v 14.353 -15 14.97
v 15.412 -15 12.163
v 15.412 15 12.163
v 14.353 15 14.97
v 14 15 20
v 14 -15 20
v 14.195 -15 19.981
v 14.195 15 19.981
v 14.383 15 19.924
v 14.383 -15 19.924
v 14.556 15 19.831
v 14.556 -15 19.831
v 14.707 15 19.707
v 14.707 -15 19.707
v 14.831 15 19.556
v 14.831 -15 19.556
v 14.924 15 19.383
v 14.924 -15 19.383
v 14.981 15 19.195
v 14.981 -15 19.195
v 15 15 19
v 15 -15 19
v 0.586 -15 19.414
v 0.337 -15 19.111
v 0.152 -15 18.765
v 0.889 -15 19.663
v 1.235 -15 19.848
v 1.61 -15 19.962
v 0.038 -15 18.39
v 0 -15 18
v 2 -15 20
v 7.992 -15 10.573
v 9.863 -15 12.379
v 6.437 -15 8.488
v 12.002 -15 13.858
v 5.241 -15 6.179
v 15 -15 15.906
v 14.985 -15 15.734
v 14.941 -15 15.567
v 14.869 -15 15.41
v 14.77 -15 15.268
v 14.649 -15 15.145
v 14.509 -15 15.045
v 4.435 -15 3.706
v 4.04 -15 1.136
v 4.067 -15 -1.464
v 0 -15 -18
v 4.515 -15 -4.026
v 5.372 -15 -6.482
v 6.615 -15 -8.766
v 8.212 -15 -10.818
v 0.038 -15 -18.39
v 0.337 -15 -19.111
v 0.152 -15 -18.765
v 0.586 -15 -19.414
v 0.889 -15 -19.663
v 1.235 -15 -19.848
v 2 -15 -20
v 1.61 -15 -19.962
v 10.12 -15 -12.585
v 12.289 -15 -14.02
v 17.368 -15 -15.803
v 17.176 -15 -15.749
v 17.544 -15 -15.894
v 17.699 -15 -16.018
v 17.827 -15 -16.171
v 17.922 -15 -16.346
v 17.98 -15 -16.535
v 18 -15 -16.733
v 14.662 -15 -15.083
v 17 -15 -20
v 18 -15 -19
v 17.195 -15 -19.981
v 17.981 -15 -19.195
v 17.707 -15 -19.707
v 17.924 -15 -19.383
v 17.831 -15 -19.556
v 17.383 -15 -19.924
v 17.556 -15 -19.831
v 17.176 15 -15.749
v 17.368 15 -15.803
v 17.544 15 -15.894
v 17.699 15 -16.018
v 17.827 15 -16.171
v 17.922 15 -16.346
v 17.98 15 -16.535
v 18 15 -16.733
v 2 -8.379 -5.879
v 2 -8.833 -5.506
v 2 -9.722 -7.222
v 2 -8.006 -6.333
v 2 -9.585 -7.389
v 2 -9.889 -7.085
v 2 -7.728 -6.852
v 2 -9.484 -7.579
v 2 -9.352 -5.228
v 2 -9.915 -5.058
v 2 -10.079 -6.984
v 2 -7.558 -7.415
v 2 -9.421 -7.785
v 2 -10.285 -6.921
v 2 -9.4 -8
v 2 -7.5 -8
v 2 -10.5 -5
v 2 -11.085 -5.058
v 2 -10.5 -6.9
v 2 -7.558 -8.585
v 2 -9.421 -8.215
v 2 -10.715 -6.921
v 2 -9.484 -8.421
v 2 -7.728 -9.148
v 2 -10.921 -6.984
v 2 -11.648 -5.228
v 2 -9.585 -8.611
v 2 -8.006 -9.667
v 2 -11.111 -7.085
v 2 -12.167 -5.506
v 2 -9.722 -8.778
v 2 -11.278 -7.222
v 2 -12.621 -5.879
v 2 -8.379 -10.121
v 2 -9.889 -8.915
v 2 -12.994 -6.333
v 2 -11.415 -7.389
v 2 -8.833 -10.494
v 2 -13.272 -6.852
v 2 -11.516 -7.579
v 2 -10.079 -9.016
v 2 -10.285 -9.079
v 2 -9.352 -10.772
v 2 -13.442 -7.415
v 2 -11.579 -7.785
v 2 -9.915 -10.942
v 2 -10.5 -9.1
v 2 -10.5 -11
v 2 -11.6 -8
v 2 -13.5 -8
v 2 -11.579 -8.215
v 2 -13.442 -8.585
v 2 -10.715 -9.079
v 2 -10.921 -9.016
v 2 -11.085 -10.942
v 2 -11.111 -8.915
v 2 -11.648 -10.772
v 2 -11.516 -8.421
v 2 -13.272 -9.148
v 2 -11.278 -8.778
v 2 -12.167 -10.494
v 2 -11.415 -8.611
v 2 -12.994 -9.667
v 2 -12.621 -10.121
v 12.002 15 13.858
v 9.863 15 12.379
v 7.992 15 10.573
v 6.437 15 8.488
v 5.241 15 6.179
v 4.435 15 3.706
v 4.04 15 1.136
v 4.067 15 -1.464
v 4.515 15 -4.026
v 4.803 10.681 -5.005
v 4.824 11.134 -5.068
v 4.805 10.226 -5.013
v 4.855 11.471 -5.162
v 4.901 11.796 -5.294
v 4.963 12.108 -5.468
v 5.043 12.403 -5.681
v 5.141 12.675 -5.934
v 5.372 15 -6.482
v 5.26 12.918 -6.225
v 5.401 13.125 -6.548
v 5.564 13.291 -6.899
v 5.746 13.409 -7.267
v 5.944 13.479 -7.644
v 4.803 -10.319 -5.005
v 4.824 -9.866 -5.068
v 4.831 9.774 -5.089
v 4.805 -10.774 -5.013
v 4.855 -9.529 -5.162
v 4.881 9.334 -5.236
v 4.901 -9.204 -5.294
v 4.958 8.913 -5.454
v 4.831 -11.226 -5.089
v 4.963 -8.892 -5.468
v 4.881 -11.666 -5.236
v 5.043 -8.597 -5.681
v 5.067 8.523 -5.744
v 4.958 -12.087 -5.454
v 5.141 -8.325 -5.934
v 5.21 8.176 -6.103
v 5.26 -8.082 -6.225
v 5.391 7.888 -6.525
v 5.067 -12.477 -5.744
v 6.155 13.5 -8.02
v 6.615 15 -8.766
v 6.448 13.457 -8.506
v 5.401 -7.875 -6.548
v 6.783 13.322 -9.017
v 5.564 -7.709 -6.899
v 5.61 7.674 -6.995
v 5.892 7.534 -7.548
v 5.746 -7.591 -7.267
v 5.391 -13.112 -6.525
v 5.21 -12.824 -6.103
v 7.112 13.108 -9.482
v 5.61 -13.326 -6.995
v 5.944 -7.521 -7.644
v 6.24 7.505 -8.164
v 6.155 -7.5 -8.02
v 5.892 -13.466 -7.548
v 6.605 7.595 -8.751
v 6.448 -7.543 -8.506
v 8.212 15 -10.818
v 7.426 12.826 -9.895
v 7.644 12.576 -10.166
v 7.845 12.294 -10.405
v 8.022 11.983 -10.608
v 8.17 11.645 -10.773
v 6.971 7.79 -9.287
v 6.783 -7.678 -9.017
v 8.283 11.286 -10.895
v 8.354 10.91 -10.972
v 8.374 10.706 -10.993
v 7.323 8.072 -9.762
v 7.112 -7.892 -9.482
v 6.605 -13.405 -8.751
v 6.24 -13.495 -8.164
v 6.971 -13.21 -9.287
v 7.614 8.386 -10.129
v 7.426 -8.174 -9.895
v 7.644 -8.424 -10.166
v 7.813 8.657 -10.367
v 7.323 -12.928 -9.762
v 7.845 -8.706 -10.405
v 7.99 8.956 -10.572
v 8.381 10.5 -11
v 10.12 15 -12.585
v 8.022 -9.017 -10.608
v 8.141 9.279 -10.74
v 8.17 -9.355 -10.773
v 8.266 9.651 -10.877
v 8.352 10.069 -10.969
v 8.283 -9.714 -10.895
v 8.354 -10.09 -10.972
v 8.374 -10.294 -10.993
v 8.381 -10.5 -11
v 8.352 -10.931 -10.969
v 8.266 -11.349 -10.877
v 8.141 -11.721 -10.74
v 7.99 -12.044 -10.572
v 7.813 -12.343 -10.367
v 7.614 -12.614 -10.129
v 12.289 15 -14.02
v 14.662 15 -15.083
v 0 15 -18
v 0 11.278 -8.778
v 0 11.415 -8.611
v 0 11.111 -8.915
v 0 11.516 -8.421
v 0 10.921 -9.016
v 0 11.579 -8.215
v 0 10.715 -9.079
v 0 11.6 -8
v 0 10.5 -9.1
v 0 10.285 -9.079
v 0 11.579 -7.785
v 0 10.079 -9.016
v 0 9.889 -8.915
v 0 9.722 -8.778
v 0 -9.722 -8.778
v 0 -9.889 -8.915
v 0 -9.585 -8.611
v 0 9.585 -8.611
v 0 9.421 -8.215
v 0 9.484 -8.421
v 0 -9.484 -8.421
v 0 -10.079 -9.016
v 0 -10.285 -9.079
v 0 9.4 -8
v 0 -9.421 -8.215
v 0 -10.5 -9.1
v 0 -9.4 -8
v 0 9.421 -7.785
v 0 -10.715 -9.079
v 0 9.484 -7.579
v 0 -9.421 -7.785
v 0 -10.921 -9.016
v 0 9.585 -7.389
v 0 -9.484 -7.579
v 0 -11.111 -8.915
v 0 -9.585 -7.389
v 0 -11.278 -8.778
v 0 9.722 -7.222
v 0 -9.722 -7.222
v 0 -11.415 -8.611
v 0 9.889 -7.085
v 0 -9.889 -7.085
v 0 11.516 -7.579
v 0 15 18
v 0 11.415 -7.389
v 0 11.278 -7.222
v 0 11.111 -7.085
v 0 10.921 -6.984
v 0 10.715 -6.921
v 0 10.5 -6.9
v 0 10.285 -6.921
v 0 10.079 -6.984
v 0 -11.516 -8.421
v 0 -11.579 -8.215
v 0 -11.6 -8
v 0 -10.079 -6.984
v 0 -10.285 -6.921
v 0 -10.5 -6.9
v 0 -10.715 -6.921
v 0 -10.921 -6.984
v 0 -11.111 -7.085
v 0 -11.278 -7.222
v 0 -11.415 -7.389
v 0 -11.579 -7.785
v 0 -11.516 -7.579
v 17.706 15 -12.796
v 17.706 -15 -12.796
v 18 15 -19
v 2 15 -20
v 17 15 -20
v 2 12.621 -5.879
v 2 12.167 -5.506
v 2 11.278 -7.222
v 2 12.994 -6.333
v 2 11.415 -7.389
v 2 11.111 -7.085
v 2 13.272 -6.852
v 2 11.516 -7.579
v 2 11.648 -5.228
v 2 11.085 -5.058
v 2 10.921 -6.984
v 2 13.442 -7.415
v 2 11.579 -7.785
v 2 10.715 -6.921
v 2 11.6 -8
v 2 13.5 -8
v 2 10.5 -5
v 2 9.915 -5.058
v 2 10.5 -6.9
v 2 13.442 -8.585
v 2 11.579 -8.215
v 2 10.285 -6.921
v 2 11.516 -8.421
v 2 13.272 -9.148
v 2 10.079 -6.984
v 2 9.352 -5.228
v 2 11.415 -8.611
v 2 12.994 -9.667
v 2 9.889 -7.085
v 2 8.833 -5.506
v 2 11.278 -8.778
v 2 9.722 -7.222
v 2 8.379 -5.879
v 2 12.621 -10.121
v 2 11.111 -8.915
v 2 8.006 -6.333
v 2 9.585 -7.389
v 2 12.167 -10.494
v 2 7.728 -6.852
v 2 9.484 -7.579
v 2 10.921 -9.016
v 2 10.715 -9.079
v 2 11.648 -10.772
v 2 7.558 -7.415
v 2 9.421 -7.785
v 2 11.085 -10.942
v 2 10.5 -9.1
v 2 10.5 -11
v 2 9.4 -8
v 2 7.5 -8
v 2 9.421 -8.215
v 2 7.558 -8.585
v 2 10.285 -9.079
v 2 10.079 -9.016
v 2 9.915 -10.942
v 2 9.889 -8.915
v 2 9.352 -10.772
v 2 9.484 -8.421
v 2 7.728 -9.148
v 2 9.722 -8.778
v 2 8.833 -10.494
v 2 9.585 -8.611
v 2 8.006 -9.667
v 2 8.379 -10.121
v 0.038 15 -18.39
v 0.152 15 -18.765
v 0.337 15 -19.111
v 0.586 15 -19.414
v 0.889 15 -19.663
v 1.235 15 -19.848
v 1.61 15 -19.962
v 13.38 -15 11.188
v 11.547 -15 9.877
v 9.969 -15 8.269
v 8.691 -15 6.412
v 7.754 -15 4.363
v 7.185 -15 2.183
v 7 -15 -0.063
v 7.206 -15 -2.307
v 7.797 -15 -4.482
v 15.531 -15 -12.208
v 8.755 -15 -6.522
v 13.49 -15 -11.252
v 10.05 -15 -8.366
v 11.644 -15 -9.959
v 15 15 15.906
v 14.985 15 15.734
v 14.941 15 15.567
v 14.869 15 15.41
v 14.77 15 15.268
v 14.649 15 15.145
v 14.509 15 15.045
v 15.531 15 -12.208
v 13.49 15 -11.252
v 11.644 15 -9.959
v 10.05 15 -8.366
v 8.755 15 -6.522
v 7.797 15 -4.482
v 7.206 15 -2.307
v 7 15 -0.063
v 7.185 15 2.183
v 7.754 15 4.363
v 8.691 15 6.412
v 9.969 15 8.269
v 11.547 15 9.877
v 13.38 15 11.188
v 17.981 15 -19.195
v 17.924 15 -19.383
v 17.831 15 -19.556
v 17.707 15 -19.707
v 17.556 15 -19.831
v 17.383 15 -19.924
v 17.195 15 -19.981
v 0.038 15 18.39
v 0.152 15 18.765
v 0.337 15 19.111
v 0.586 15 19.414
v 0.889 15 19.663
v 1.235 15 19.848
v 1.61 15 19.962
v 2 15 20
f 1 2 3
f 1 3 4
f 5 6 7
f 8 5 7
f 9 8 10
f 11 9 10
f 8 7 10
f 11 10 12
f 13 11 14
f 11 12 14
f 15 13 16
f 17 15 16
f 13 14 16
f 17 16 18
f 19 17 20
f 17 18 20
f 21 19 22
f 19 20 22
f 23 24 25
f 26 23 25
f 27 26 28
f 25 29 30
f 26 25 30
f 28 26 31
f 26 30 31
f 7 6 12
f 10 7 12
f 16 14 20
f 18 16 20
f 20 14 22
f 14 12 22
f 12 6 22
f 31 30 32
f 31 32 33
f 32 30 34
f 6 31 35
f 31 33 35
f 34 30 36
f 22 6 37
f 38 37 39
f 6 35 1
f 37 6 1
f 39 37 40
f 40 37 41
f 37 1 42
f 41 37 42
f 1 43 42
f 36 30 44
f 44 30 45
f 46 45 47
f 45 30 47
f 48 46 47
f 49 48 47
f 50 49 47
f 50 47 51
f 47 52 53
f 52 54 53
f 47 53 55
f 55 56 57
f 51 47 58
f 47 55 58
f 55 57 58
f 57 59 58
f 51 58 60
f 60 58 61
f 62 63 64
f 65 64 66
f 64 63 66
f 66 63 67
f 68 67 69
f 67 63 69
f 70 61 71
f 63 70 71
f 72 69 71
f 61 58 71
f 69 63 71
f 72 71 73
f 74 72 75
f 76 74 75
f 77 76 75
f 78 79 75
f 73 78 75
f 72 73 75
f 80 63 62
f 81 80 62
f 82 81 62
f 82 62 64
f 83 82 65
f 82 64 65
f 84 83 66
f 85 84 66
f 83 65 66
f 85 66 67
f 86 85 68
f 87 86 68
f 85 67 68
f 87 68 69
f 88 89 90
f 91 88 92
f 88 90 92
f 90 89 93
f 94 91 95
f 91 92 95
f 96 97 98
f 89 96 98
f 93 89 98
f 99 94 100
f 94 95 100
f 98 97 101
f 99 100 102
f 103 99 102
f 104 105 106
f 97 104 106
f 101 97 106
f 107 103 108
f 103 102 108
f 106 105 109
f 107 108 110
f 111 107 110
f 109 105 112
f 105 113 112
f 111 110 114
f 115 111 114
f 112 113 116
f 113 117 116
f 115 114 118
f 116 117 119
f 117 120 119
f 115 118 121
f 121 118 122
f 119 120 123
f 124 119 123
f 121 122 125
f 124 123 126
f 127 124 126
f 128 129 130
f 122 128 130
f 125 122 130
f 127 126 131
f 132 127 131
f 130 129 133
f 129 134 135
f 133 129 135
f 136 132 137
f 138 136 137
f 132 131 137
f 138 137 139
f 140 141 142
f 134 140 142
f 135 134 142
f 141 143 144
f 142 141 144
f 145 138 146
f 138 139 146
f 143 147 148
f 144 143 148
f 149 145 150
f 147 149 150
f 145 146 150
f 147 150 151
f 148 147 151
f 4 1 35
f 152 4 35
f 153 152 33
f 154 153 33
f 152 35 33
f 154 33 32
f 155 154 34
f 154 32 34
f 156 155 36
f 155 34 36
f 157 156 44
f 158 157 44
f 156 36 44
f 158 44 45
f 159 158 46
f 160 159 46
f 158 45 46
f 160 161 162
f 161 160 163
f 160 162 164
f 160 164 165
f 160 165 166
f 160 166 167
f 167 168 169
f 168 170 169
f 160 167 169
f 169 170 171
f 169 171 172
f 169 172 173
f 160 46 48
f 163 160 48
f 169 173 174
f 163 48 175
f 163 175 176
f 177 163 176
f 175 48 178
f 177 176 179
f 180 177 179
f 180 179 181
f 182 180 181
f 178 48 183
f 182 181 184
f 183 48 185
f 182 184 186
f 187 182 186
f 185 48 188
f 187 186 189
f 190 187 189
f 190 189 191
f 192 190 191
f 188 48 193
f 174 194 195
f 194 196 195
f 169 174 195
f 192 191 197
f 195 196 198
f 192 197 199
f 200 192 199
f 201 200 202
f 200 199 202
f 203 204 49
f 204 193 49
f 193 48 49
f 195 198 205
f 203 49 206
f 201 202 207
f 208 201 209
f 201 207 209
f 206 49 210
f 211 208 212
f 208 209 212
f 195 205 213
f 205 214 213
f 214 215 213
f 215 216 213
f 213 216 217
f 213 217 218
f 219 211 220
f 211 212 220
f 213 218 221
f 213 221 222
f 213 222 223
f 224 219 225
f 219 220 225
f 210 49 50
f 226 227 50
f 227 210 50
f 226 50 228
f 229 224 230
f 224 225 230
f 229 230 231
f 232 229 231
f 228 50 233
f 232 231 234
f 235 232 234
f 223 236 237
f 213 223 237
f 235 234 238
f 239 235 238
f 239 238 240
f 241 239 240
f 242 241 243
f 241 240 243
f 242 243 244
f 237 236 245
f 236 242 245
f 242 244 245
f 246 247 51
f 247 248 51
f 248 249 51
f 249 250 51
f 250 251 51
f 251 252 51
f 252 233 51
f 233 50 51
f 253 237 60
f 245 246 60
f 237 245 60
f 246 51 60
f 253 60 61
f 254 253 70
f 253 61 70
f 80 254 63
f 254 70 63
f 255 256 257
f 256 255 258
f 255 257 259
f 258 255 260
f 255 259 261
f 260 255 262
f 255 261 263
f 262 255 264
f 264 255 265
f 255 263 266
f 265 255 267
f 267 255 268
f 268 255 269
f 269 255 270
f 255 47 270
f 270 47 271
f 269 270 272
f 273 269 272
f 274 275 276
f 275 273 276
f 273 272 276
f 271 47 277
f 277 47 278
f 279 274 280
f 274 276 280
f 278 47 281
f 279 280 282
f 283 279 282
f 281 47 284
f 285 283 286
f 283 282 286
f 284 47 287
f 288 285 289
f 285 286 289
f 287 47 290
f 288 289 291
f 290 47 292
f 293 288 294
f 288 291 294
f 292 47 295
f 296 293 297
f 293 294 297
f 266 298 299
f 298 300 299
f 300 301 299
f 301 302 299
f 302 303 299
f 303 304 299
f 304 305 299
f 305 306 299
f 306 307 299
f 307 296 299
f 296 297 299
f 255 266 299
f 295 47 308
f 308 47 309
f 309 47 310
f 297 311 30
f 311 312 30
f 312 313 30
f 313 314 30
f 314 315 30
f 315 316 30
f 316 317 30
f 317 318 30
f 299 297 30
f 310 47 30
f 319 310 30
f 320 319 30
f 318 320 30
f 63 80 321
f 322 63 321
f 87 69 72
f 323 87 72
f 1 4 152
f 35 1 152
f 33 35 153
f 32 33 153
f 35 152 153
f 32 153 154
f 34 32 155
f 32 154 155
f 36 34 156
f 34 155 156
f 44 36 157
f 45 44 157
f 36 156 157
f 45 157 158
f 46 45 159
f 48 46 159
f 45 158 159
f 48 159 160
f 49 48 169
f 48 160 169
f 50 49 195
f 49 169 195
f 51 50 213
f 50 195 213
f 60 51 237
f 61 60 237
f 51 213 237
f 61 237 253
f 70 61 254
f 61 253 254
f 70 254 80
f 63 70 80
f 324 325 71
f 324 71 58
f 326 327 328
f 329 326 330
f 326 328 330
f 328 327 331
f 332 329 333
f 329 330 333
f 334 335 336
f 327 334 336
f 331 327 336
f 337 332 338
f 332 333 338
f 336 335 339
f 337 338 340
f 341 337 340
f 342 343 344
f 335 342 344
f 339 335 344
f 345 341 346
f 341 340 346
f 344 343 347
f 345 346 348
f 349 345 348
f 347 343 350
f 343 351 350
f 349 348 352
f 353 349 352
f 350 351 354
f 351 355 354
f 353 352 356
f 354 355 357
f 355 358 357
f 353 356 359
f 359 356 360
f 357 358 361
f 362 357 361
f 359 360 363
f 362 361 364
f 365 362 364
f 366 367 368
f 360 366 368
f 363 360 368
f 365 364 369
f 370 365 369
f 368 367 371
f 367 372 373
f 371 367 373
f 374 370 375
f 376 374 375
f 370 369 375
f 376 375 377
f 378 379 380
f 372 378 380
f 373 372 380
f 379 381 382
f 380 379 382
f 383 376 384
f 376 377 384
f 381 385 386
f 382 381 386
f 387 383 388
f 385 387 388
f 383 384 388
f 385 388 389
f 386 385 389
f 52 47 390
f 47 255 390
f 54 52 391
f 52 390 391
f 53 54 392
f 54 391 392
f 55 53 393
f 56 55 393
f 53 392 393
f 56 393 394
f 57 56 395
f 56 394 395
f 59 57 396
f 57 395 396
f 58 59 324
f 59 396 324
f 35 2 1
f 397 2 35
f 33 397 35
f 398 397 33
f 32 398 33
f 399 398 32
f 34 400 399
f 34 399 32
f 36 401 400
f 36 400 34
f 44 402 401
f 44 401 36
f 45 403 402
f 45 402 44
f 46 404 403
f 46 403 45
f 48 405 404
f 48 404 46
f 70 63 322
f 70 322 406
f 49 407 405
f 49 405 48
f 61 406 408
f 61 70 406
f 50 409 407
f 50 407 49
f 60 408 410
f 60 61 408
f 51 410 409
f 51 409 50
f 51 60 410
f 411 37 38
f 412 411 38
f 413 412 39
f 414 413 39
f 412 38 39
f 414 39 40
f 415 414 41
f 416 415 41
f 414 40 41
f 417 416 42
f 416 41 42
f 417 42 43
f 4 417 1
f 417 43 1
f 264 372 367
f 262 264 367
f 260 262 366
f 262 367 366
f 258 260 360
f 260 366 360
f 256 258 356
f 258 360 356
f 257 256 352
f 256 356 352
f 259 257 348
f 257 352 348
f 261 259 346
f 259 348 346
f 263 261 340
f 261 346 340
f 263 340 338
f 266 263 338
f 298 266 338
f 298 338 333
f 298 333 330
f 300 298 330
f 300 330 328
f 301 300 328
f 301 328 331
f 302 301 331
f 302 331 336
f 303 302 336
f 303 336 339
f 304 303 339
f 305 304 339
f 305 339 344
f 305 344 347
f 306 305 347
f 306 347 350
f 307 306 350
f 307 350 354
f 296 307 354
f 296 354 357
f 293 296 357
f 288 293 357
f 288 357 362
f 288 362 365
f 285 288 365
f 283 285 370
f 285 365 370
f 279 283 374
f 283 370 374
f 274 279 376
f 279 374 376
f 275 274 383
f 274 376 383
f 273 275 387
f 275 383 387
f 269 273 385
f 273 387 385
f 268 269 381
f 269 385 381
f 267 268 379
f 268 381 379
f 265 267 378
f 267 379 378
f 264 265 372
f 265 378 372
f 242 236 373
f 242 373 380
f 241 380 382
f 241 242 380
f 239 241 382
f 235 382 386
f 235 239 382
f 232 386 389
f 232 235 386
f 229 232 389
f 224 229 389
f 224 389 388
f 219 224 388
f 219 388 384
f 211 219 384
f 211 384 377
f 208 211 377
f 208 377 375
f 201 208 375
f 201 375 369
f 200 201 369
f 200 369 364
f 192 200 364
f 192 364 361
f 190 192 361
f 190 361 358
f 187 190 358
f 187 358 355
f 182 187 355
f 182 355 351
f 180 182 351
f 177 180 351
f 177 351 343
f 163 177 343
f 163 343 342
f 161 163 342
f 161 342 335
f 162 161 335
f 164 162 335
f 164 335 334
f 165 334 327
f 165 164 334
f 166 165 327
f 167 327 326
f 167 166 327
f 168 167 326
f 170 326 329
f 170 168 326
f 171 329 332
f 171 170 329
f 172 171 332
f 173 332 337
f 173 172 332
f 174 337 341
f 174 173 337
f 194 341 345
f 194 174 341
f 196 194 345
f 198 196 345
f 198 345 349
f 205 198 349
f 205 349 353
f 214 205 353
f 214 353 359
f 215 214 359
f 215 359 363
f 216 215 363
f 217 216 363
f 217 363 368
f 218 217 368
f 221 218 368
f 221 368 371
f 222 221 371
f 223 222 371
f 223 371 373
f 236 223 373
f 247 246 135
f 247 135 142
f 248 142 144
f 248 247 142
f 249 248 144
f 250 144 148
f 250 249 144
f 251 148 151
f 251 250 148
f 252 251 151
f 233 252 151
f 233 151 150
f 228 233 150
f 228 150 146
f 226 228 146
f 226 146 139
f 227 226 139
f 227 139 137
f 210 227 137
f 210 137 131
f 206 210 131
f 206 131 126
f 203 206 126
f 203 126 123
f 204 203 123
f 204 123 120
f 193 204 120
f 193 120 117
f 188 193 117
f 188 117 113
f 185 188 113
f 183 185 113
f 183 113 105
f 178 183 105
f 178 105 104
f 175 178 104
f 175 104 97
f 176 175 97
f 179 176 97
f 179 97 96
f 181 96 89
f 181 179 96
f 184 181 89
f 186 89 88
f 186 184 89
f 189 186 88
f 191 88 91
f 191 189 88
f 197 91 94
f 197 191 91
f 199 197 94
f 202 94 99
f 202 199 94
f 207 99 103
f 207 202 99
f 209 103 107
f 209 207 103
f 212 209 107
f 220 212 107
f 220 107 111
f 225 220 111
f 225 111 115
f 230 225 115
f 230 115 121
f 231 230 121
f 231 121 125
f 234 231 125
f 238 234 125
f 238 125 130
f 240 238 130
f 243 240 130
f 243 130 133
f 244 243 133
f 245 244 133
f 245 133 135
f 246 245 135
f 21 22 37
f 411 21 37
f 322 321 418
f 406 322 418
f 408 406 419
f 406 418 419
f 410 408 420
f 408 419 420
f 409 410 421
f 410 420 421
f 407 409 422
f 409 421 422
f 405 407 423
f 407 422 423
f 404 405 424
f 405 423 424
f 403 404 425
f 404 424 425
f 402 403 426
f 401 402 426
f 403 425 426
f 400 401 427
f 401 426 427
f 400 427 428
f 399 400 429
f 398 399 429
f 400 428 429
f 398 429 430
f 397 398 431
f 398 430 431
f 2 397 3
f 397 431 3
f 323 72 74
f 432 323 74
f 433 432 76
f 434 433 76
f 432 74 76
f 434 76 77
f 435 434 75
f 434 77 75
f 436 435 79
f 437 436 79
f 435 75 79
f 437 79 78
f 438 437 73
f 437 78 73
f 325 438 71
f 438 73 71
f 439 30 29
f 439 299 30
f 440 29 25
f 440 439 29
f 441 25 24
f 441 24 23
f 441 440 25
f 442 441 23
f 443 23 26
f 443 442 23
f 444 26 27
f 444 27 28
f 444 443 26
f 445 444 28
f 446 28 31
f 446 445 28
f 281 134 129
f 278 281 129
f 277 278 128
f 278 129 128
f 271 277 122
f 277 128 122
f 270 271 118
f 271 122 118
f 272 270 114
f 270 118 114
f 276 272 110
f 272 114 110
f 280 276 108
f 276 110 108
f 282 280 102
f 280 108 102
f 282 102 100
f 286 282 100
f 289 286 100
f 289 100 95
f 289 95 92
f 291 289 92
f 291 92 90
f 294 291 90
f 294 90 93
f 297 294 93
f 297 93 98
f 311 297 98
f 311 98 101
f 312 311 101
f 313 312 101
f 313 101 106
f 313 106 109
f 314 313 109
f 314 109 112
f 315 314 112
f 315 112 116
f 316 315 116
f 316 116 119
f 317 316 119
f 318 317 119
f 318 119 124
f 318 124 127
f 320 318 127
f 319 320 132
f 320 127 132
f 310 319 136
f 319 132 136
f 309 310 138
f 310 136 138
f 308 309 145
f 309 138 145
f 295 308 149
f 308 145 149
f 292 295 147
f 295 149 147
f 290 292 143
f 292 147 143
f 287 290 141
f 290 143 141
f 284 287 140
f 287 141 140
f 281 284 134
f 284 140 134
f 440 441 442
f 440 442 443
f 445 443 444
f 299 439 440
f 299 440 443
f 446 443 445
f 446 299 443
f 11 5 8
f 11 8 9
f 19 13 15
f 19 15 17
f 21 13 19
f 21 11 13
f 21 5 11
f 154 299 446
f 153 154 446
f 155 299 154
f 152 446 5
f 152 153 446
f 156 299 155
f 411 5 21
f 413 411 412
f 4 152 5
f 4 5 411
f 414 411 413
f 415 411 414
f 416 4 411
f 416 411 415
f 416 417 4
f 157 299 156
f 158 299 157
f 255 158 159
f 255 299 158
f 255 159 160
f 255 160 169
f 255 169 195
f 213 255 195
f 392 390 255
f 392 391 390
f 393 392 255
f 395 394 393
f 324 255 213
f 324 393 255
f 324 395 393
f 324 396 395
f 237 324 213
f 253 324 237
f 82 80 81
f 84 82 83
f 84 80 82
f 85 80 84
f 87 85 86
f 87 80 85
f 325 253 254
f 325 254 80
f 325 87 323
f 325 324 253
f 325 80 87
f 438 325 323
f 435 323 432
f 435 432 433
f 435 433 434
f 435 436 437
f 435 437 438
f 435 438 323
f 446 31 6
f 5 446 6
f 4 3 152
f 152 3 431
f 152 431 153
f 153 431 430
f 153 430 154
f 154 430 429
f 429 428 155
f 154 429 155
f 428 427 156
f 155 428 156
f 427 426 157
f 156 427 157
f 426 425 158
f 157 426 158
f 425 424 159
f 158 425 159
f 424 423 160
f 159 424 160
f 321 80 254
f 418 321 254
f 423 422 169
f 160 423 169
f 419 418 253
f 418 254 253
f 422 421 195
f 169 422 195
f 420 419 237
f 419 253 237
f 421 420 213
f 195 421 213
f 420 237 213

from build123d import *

# Parameters (mm, degrees)
EXTRUDE_1_DEPTH      = 15
EXTRUDE_1_DEPTH_BACK = 15
SKETCH_2_R           = 1.1
CUT_EXTRUDE_1_DEPTH  = 31.805843601
SKETCH_3_R           = 3
CUT_EXTRUDE_2_DEPTH  = 8
FILLET_1_R           = 2
EXTRUDE_2_DEPTH      = 30


with BuildPart() as part:
    # ｽｹｯﾁ1 → ﾎﾞｽ - 押し出し1 (new, two sides: drawn at the far end of the back side and taken through both)
    with BuildSketch(Plane(origin=(0, 0, 0), x_dir=(1, 0, 0), z_dir=(0, 1, 0)).offset(-EXTRUDE_1_DEPTH_BACK)):
        with BuildLine():
            Line((0, 20), (0, -20))
            Line((0, -20), (14, -20))
            ThreePointArc((14, -20), (14.707106781, -19.707106781), (15, -19))
            Line((15, -19), (15, -15.905973721))
            ThreePointArc((15, -15.905973721), (14.822478321, -15.337177262), (14.352941176, -14.970328208))
            ThreePointArc((14.352941176, -14.970328208), (4.06716036, 1.464452457), (17.176470588, 15.748894617))
            ThreePointArc((17.176470588, 15.748894617), (17.766964989, 16.091511583), (18, 16.733200531))
            Line((18, 16.733200531), (18, 19))
            ThreePointArc((18, 19), (17.707106781, 19.707106781), (17, 20))
            Line((17, 20), (0, 20))
        make_face()
    extrude(amount=EXTRUDE_1_DEPTH + EXTRUDE_1_DEPTH_BACK)

    # ｽｹｯﾁ2 → ｶｯﾄ - 押し出し1 (cut, through all)
    with BuildSketch(Plane(origin=(18, 0, 0), x_dir=(0, 0, -1), z_dir=(1, 0, 0))):
        with Locations((8, 10.5)):
            Circle(SKETCH_2_R)
        with Locations((8, -10.5)):
            Circle(SKETCH_2_R)
    extrude(amount=-CUT_EXTRUDE_1_DEPTH, mode=Mode.SUBTRACT)

    # ｽｹｯﾁ3 → ｶｯﾄ - 押し出し2 (cut)
    with BuildSketch(Plane.ZY.offset(-10)):
        with Locations(Location((-8, 10.5, 0), (0, 0, 180))):
            Circle(SKETCH_3_R)
        with Locations(Location((-8, -10.5, 0), (0, 0, 180))):
            Circle(SKETCH_3_R)
    extrude(amount=CUT_EXTRUDE_2_DEPTH, mode=Mode.SUBTRACT)

    # ﾌｨﾚｯﾄ1
    fillet_1_edges = [part.edges().sort_by_distance(p)[0] for p in [
        (0, 0, 20),
        (0, 0, -20),
    ]]
    fillet(fillet_1_edges, radius=FILLET_1_R)


with BuildPart() as body_2:
    # ｽｹｯﾁ5 → ﾎﾞｽ - 押し出し2 (new body)
    with BuildSketch(Plane(origin=(0, 15, 0), x_dir=(1, 0, 0), z_dir=(0, 1, 0))):
        with BuildLine():
            Line((17.176470588, 15.748894617), (17.705882353, 12.795976876))
            ThreePointArc((17.705882353, 12.795976876), (7.054567792, 1.189867621), (15.411764706, -12.163391669))
            Line((15.411764706, -12.163391669), (14.352941176, -14.970328208))
            ThreePointArc((14.352941176, -14.970328208), (4.06716036, 1.464452457), (17.176470588, 15.748894617))
        make_face()
    extrude(amount=-EXTRUDE_2_DEPTH)


solid = Compound([part.part, body_2.part])
